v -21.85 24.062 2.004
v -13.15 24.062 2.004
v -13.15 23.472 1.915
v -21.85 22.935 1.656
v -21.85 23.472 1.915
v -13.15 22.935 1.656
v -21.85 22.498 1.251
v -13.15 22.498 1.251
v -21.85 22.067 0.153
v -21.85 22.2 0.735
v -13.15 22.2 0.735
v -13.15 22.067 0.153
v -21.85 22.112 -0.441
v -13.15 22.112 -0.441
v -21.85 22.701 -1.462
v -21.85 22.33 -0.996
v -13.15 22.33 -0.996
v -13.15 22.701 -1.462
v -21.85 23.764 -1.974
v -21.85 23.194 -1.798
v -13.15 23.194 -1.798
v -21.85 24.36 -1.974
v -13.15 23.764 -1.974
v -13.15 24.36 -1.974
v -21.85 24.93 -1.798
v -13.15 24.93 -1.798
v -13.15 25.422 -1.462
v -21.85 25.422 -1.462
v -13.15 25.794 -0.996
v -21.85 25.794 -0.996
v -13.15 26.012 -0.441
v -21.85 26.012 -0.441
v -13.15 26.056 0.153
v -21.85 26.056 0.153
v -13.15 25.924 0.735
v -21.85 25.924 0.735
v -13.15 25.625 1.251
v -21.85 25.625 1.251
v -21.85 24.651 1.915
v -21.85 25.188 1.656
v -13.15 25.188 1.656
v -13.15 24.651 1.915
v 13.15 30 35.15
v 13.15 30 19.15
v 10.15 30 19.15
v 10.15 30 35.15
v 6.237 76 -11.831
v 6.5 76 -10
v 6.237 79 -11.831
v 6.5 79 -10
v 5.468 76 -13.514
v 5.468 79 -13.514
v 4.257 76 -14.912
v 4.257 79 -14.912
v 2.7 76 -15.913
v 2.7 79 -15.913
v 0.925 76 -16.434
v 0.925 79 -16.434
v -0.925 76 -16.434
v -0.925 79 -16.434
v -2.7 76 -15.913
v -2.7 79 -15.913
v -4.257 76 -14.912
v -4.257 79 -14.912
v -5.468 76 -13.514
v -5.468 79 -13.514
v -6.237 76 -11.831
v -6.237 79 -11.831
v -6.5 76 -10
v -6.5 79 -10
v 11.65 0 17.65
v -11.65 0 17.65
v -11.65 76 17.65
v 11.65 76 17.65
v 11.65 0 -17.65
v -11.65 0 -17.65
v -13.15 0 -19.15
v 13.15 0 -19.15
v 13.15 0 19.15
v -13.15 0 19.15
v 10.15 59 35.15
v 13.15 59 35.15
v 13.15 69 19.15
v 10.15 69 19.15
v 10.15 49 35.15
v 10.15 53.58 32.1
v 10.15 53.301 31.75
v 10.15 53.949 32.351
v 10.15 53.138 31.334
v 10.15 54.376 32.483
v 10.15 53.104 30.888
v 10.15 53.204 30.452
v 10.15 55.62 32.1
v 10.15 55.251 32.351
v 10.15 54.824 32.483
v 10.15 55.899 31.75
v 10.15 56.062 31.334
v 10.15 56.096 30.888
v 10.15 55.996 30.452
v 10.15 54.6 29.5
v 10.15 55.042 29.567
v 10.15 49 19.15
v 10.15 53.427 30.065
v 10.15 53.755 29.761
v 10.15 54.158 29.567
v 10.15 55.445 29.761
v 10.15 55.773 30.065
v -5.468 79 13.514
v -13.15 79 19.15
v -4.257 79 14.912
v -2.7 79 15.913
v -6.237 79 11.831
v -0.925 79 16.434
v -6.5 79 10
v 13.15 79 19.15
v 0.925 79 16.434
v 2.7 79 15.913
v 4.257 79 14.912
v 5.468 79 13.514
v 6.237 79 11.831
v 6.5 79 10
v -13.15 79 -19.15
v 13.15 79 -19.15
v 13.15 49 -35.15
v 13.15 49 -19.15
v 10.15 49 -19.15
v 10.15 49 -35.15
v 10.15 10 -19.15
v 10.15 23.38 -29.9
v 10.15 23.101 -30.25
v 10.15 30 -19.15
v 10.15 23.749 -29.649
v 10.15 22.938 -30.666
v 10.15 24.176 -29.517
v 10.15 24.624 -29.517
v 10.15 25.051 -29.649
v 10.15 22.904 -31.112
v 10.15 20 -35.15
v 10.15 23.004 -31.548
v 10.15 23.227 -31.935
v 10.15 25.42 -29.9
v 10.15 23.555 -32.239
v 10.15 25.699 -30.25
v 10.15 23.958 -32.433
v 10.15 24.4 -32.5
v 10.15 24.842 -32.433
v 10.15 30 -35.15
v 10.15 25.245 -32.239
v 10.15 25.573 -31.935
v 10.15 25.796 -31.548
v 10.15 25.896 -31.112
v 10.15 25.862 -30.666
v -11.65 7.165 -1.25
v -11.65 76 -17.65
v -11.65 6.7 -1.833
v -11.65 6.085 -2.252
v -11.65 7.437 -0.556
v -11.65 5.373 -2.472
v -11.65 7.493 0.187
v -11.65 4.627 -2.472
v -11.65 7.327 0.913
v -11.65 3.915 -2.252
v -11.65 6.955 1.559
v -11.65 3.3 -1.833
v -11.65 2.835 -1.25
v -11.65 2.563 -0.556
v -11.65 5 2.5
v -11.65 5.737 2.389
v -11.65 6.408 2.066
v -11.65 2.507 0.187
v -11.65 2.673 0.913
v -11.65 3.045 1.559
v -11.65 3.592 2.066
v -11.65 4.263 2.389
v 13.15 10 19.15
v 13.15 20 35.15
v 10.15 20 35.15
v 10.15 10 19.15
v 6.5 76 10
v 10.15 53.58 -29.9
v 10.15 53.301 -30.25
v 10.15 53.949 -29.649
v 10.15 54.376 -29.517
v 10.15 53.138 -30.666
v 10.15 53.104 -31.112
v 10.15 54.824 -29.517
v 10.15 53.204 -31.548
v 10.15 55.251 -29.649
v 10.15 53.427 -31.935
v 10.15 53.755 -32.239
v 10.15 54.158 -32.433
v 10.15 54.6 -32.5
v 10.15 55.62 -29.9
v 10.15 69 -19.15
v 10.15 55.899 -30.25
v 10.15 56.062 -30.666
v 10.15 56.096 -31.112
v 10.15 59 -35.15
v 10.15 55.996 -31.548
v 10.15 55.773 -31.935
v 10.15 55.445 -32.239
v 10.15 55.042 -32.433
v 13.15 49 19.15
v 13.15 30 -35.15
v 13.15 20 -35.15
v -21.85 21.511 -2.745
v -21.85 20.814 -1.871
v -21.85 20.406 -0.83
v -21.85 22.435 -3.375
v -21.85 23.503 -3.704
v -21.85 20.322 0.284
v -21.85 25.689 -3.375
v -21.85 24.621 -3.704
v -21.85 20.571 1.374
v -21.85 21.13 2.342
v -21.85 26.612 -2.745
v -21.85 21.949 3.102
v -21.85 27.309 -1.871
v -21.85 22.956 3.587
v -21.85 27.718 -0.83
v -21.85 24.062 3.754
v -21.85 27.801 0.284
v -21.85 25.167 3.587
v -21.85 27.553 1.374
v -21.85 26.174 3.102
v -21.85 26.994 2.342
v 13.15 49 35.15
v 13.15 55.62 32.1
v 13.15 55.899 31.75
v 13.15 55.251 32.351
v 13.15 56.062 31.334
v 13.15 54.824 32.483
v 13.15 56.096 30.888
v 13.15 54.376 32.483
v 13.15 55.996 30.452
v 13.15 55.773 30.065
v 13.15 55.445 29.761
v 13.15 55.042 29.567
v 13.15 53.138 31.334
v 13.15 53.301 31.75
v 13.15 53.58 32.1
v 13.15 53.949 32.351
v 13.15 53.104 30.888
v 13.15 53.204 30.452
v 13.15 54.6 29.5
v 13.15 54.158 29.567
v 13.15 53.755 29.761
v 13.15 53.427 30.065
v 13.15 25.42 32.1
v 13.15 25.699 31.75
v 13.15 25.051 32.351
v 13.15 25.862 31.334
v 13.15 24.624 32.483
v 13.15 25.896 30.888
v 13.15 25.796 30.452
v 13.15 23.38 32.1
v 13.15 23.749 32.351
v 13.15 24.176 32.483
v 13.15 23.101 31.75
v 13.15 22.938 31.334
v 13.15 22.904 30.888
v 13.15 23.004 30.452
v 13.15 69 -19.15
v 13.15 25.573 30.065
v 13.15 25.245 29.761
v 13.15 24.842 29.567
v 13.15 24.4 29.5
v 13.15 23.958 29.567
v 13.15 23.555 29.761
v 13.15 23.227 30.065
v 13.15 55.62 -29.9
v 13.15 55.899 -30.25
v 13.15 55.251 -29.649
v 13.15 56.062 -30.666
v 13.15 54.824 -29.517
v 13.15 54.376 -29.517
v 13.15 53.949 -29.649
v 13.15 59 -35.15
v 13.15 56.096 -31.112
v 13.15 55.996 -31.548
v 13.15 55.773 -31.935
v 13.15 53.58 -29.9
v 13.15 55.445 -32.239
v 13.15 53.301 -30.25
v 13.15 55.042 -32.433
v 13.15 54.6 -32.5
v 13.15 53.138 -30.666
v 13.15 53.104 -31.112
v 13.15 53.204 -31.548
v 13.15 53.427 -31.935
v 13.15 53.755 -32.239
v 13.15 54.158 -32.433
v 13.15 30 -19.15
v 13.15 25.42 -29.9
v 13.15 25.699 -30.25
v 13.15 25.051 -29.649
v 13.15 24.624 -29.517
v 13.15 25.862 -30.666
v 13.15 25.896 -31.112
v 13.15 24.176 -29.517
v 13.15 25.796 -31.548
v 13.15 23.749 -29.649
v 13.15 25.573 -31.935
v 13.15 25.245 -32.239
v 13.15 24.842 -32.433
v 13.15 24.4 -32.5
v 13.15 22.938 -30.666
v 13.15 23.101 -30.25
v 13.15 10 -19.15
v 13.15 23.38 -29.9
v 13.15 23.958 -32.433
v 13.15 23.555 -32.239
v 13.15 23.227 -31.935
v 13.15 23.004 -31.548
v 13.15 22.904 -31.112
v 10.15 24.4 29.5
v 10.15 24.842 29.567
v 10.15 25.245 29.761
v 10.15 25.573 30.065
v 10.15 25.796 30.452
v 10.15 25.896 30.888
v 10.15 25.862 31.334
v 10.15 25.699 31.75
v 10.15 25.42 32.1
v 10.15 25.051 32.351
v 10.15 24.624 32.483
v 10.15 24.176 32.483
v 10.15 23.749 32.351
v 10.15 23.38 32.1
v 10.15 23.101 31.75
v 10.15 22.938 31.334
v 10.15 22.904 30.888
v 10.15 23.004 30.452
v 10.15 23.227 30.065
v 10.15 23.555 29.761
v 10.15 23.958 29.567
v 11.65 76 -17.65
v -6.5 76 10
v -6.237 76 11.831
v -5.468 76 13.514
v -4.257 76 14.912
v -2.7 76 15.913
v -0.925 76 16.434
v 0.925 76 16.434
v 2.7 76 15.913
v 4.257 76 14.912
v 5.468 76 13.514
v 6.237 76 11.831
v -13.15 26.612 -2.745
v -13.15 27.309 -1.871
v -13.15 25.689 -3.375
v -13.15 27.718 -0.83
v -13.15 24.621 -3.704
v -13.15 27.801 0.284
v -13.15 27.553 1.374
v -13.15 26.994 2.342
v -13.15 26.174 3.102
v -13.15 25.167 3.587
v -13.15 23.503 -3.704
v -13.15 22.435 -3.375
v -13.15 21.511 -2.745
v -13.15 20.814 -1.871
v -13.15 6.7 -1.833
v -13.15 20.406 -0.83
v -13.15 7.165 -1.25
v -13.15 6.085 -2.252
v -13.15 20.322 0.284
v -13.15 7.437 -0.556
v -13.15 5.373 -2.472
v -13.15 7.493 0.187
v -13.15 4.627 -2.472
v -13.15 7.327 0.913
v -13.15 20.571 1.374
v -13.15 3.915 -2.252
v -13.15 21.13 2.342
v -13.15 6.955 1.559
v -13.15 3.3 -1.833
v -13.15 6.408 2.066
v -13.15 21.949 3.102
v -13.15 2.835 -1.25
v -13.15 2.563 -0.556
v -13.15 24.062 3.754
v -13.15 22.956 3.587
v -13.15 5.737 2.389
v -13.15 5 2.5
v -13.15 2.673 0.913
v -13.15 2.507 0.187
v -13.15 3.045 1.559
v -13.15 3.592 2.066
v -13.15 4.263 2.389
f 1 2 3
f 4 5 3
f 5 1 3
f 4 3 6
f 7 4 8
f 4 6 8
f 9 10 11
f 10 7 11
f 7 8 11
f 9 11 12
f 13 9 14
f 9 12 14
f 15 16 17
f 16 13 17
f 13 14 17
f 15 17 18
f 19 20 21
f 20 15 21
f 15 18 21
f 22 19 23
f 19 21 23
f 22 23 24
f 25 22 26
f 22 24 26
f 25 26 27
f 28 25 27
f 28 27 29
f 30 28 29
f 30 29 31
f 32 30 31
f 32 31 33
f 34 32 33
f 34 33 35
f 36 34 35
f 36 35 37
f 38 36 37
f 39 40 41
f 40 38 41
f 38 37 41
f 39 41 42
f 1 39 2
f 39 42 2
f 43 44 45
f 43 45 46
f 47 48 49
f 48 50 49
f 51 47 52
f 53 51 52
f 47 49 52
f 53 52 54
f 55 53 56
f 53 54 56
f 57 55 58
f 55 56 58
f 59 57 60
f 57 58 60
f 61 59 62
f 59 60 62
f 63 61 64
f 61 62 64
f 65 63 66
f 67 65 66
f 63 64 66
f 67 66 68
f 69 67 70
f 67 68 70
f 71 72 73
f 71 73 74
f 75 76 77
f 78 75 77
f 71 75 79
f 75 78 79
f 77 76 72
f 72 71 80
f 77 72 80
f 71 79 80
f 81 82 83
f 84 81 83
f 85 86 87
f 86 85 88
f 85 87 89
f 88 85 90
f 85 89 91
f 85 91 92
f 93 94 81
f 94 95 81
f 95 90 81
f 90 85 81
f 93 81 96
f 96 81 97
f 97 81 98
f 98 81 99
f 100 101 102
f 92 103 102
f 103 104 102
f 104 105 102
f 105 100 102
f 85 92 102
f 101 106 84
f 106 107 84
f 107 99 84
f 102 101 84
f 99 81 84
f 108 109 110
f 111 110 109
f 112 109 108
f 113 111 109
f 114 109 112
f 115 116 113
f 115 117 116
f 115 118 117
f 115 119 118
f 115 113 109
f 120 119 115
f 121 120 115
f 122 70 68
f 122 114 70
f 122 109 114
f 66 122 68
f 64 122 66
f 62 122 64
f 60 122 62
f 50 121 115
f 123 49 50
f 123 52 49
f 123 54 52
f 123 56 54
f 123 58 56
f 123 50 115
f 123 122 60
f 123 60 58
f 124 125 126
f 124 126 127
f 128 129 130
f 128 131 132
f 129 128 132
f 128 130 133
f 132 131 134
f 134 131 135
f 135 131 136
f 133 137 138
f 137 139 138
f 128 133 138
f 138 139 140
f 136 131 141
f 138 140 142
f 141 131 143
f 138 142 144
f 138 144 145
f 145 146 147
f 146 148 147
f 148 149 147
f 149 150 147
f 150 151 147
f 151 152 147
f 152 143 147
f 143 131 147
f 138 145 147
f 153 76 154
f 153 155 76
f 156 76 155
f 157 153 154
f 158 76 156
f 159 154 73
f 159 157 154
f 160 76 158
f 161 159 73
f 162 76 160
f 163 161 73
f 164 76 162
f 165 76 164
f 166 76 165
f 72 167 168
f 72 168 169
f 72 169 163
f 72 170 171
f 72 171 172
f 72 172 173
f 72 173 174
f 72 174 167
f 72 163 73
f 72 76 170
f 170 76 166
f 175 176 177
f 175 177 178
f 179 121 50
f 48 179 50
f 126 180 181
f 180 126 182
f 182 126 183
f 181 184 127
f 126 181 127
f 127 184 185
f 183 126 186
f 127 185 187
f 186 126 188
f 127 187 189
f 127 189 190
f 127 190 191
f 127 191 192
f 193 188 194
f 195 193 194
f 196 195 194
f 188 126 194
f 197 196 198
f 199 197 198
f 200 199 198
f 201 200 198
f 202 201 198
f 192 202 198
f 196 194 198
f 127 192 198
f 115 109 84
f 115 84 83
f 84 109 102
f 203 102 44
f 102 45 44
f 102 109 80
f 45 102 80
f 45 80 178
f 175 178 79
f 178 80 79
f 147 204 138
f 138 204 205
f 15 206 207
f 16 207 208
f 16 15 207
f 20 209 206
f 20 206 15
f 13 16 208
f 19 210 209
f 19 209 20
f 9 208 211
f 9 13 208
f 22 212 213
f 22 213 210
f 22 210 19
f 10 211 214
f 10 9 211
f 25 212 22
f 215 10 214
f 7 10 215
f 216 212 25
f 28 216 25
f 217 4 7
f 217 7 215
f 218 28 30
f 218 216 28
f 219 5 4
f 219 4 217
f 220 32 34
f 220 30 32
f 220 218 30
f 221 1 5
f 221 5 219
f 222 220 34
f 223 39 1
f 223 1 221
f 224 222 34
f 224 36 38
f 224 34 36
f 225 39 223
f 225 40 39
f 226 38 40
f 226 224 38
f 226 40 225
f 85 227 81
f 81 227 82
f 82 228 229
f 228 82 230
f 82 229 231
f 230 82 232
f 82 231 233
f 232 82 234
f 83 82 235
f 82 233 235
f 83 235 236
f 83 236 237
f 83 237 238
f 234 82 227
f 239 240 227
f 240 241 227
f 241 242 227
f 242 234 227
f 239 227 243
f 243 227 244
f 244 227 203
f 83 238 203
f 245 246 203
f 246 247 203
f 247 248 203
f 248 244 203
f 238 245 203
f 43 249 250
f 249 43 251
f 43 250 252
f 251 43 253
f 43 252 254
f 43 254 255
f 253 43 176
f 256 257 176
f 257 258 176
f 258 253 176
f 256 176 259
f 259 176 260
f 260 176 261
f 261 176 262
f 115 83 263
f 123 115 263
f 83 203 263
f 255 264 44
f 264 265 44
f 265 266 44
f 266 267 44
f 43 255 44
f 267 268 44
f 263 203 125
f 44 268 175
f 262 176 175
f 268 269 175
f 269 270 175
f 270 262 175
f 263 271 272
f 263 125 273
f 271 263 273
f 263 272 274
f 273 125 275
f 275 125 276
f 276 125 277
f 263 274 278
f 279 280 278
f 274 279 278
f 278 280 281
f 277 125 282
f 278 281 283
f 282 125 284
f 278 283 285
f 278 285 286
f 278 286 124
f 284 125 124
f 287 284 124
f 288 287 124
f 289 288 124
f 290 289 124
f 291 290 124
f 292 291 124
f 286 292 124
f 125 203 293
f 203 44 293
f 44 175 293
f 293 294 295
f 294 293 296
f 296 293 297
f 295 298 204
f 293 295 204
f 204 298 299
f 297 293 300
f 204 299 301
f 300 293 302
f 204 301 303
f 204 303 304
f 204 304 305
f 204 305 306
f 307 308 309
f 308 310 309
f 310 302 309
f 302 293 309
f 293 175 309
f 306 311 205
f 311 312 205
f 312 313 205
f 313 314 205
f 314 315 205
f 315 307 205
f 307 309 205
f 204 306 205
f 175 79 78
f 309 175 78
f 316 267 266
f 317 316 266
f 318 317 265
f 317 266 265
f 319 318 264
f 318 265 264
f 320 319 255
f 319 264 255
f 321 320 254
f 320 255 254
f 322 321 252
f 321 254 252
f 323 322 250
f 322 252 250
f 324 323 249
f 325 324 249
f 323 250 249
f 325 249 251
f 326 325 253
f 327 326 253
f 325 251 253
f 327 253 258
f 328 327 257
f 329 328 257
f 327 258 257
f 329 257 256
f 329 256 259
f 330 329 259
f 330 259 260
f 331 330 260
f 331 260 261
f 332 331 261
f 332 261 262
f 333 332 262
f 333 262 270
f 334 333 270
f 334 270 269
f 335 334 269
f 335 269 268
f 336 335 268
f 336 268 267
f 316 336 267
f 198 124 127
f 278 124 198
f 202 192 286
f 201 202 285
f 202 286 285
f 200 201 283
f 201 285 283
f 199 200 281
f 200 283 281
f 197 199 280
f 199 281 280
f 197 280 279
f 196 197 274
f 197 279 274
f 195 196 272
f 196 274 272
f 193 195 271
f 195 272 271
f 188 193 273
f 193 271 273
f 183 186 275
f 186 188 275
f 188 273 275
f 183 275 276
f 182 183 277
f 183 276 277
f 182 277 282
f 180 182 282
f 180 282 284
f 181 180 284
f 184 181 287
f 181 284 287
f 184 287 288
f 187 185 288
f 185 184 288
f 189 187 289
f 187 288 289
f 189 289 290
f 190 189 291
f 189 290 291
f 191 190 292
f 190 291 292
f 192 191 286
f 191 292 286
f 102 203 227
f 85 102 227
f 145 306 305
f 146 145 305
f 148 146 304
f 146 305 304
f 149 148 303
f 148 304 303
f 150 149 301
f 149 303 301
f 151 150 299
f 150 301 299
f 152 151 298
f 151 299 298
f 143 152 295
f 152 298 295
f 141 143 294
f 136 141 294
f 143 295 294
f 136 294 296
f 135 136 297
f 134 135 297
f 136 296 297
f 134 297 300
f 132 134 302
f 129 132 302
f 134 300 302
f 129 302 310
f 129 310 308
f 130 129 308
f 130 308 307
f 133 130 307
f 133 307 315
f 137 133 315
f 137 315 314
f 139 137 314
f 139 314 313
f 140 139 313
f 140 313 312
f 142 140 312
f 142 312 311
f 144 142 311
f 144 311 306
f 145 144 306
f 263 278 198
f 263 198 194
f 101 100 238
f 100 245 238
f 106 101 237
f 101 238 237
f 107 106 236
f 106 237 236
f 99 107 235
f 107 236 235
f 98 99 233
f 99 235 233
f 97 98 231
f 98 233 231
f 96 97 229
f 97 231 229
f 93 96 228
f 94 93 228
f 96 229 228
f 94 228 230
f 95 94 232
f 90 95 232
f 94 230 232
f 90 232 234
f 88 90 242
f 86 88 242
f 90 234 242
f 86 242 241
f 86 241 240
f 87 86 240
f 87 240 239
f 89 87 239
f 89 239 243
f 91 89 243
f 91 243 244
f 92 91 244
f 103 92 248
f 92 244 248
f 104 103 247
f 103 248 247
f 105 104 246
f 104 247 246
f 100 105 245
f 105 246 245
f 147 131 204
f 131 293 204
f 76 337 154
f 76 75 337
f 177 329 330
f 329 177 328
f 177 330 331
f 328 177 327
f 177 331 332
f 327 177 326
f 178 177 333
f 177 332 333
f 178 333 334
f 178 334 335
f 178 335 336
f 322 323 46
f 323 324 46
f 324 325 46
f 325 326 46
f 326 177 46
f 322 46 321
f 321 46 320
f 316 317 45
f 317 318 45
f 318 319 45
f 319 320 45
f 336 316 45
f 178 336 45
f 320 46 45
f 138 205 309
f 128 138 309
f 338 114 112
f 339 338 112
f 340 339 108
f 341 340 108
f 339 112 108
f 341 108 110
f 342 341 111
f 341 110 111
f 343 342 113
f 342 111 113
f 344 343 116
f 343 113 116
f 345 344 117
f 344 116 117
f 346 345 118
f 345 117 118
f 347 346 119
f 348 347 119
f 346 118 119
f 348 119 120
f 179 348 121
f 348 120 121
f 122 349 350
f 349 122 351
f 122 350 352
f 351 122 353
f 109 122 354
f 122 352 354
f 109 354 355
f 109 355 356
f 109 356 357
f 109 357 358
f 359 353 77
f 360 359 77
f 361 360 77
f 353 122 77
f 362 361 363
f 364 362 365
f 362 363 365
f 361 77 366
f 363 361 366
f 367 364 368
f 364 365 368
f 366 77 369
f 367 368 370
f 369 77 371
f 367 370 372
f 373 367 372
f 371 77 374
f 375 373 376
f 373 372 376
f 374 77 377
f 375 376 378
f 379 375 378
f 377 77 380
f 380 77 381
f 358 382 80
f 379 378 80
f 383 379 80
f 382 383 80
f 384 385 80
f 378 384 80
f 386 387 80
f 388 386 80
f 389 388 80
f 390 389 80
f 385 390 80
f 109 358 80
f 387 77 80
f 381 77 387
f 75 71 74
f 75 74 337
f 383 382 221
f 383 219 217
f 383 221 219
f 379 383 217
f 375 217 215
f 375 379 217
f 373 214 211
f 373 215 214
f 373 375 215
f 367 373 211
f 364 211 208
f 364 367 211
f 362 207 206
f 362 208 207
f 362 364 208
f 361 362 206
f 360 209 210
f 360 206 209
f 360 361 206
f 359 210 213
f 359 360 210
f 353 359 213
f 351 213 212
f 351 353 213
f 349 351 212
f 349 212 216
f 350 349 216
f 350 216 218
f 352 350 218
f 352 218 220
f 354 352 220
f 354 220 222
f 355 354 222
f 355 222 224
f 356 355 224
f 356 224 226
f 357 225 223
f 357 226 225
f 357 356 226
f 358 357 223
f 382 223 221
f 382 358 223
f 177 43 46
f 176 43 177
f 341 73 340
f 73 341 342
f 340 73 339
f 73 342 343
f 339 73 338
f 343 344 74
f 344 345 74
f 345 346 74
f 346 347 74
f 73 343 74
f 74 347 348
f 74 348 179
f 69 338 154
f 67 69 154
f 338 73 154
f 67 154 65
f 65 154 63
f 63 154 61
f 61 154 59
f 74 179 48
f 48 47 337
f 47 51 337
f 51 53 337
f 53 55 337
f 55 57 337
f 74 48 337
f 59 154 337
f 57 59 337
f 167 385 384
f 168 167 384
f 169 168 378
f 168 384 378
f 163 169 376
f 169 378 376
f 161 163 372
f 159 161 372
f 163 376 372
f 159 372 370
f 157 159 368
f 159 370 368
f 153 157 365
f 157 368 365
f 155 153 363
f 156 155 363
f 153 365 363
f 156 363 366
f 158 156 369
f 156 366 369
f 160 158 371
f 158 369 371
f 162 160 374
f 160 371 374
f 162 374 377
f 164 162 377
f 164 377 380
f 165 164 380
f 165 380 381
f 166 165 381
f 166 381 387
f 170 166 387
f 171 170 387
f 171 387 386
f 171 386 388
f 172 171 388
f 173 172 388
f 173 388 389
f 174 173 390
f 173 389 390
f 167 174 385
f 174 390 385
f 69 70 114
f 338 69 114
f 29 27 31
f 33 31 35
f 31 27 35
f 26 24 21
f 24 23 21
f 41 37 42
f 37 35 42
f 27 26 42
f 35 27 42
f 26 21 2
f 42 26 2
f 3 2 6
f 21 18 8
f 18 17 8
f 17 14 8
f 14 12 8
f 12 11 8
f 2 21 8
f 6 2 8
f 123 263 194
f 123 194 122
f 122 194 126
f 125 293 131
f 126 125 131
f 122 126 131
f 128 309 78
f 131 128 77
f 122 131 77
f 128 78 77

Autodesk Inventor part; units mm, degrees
ref_plane "YZ Plane" through (0, 0, 0) normal (1, 0, 0) x (0, 1, 0)
ref_plane "XZ Plane" through (0, 0, 0) normal (0, 1, 0) x (-1, 0, 0)
ref_plane "XY Plane" through (0, 0, 0) normal (0, 0, 1) x (1, 0, 0)
sketch "Эскиз1" plane through (0, 0, 0) normal (0, 1, 0) x (-1, 0, 0)
  line L0 (11, 17) -> (-11, 17)
  line L1 (-11, 17) -> (-11, -17)
  line L2 (-11, -17) -> (11, -17)
  line L3 (11, -17) -> (11, 17)
  line L4 (11, 17) -> (-11, -17) construction
  line L5 (11.65, 17.65) -> (-11.65, 17.65)
  line L6 (-11.65, 17.65) -> (-11.65, -17.65)
  line L7 (-11.65, -17.65) -> (11.65, -17.65)
  line L8 (11.65, -17.65) -> (11.65, 17.65)
  line L9 (11.65, 17.65) -> (-11.65, -17.65) construction
  line L10 (13.15, 19.15) -> (-13.15, 19.15)
  line L11 (-13.15, 19.15) -> (-13.15, -19.15)
  line L12 (-13.15, -19.15) -> (13.15, -19.15)
  line L13 (13.15, -19.15) -> (13.15, 19.15)
  line L14 (13.15, 19.15) -> (-13.15, -19.15) construction
  point P0 (0, 0)
  point P1 (0, 0)
  point P2 (0, 0)
  dimension "d0" = 22
  dimension "d1" = 34
  dimension "d2" = 23.3
  dimension "d3" = 35.3
  dimension "d4" = 26.3
  dimension "d5" = 38.3
extrude "Выдавливание1" add sketch "Эскиз1" along normal blind 76 contours L13 L12 L11 L10
sketch "Эскиз2" plane through (0, 76, 0) normal (0, 1, 0) x (1, 0, 0)
  line L0 (11, 17) -> (-11, 17)
  line L1 (-11, 17) -> (-11, -17)
  line L2 (-11, -17) -> (11, -17)
  line L3 (11, -17) -> (11, 17)
  line L4 (11, 17) -> (-11, -17) construction
  line L5 (11.65, 17.65) -> (-11.65, 17.65)
  line L6 (-11.65, 17.65) -> (-11.65, -17.65)
  line L7 (-11.65, -17.65) -> (11.65, -17.65)
  line L8 (11.65, -17.65) -> (11.65, 17.65)
  line L9 (11.65, 17.65) -> (-11.65, -17.65) construction
  line L10 (13.15, 19.15) -> (-13.15, 19.15)
  line L11 (-13.15, 19.15) -> (-13.15, -19.15)
  line L12 (-13.15, -19.15) -> (13.15, -19.15)
  line L13 (13.15, -19.15) -> (13.15, 19.15)
  line L14 (13.15, 19.15) -> (-13.15, -19.15) construction
  point P0 (0, 0)
  point P1 (0, 0)
  point P2 (0, 0)
  dimension "d10" = 22
  dimension "d11" = 34
  dimension "d12" = 23.3
  dimension "d13" = 35.3
  dimension "d14" = 26.3
  dimension "d15" = 38.3
extrude "Выдавливание2" add sketch "Эскиз2" along normal blind 3 contours L3 L2 L1 L0 | L8 L7 L6 L5 | L13 L12 L11 L10
sketch "Эскиз3" plane through (0, 79, 0) normal (0, 1, 0) x (1, 0, 0)
  line L0 (0, 10) -> (0, -10) construction
  line L1 (-6.5, 10) -> (-6.5, -10)
  line L2 (6.5, -10) -> (6.5, 10)
  arc A0 (6.5, 10) -> (-6.5, 10) centre (0, 10) ccw
  arc A1 (-6.5, -10) -> (6.5, -10) centre (0, -10) ccw
  line L3 (13.15, -19.15) -> (13.15, 19.15) projected
  line L4 (13.15, 19.15) -> (-13.15, 19.15) projected
  point P0 (0, 0)
  point P1 (13.15, 0)
  dimension "d21" = 20
  dimension "d22" = 13
  dimension "d23" = 6.65
  dimension "d24" = 19.15
extrude "Выдавливание3" cut sketch "Эскиз3" against normal blind 3
sketch "Эскиз4" plane through (13.15, 0, 19.15) normal (1, 0, 0) x (0, 0, -1)
  line L0 (0, 0) -> (0, 79) projected
  line L1 (38.3, 0) -> (38.3, 79) projected
  line L2 (0, 79) -> (38.3, 79)
  line L3 (38.3, 79) -> (38.3, 0)
  line L4 (38.3, 0) -> (0, 0)
  line L5 (0, 0) -> (0, 79)
  circle A0 centre (50.15, 54.6) radius 1.5
  line L6 (50.15, 54.6) -> (-11.85, 54.6)
  line L7 (-11.85, 54.6) -> (-11.85, 24.4)
  line L8 (-11.85, 24.4) -> (50.15, 24.4)
  line L9 (50.15, 24.4) -> (50.15, 54.6)
  circle A1 centre (-11.85, 54.6) radius 1.5
  circle A2 centre (-11.85, 24.4) radius 1.5
  circle A3 centre (50.15, 24.4) radius 1.5
  line L10 (38.3, 79) -> (0, 79) projected
  line L11 (19.15, 79) -> (19.15, 0)
  line L12 (0, 39.5) -> (38.3, 39.5)
  line L13 (38.3, 39.5) -> (0, 39.5)
  circle A4 centre (-11.85, 24.4) radius 1.5
  line L14 (38.3, 49) -> (54.3, 49)
  line L15 (54.3, 49) -> (54.3, 59)
  line L16 (54.3, 59) -> (38.3, 69)
  line L17 (38.3, 30) -> (54.3, 30)
  line L18 (54.3, 30) -> (54.3, 20)
  line L19 (54.3, 20) -> (38.3, 10)
  line L20 (-16, 20) -> (0, 10)
  line L21 (-16, 30) -> (-16, 20)
  line L22 (0, 30) -> (-16, 30)
  line L23 (0, 49) -> (-16, 49)
  line L24 (-16, 49) -> (-16, 59)
  line L25 (-16, 59) -> (0, 69)
  point P0 (54.3, 54)
  point P1 (54.3, 25)
  point P2 (50.15, 30)
  point P3 (50.15, 49)
  point P4 (-11.85, 49)
  point P5 (-11.85, 30)
  dimension "d50" = 3
  dimension "d53" = 62
  dimension "d54" = 30.2
  dimension "d55" = 11.85
  dimension "d56" = 3
  dimension "d57" = 3
  dimension "d61" = 24.4
  dimension "d62" = 30
  dimension "d63" = 10
  dimension "d64" = 10
  dimension "d65" = 4.15
extrude "Выдавливание5" add sketch "Эскиз4" against normal blind 3 contours L20 L21 L22 L7 A2 L8 L0 | L8 A2 L7 L22 L0 | L1 L8 A3 L9 L17 L18 L19 | L1 L17 L9 A3 L8 | L23 L7 A1 L6 L0 | L23 L24 L25 L0 L6 A1 L7 | L6 A0 L9 L14 L1 | L1 L16 L15 L14 L9 A0 L6
sketch "Эскиз5" plane through (-13.15, 0, -19.15) normal (-1, 0, 0) x (0, 0, 1)
  circle A0 centre (19.15, 5) radius 2.5
  point P0 (19.15, 0)
  dimension "d69" = 5
extrude "Выдавливание6" cut sketch "Эскиз5" against normal blind 13.5
sketch "Эскиз6" plane through (-13.15, 0, -19.15) normal (-1, 0, 0) x (0, 0, 1)
  circle A0 centre (19.154, 24.0618) radius 1.65
  circle A1 centre (19.154, 24.0618) radius 2
  circle A2 centre (19.154, 24.0618) radius 3.75
  point P0 (19.15, 0)
  dimension "d72" = 3.3
  dimension "d73" = 4
  dimension "d74" = 7.5
extrude "Выдавливание7" add sketch "Эскиз6" along normal blind 8.7 contours A2
equation "\"d2\" = d0 + d6"
equation "\"d3\" = d1 + d6"
equation "\"d4\" = d6 + d0 + d7"
equation "\"d5\" = d6 + d1 + d7"
equation "\"d12\" = d10 + d16"
equation "\"d13\" = d11 + d16"
equation "\"d14\" = d16 + d10 + d17"
equation "\"d15\" = d16 + d11 + d17"
equation "\"d6\" = 1.3"
equation "\"d7\" = 3"
equation "\"d16\" = 1.3"
equation "\"d17\" = 3"
properties part number "akb_mount"
